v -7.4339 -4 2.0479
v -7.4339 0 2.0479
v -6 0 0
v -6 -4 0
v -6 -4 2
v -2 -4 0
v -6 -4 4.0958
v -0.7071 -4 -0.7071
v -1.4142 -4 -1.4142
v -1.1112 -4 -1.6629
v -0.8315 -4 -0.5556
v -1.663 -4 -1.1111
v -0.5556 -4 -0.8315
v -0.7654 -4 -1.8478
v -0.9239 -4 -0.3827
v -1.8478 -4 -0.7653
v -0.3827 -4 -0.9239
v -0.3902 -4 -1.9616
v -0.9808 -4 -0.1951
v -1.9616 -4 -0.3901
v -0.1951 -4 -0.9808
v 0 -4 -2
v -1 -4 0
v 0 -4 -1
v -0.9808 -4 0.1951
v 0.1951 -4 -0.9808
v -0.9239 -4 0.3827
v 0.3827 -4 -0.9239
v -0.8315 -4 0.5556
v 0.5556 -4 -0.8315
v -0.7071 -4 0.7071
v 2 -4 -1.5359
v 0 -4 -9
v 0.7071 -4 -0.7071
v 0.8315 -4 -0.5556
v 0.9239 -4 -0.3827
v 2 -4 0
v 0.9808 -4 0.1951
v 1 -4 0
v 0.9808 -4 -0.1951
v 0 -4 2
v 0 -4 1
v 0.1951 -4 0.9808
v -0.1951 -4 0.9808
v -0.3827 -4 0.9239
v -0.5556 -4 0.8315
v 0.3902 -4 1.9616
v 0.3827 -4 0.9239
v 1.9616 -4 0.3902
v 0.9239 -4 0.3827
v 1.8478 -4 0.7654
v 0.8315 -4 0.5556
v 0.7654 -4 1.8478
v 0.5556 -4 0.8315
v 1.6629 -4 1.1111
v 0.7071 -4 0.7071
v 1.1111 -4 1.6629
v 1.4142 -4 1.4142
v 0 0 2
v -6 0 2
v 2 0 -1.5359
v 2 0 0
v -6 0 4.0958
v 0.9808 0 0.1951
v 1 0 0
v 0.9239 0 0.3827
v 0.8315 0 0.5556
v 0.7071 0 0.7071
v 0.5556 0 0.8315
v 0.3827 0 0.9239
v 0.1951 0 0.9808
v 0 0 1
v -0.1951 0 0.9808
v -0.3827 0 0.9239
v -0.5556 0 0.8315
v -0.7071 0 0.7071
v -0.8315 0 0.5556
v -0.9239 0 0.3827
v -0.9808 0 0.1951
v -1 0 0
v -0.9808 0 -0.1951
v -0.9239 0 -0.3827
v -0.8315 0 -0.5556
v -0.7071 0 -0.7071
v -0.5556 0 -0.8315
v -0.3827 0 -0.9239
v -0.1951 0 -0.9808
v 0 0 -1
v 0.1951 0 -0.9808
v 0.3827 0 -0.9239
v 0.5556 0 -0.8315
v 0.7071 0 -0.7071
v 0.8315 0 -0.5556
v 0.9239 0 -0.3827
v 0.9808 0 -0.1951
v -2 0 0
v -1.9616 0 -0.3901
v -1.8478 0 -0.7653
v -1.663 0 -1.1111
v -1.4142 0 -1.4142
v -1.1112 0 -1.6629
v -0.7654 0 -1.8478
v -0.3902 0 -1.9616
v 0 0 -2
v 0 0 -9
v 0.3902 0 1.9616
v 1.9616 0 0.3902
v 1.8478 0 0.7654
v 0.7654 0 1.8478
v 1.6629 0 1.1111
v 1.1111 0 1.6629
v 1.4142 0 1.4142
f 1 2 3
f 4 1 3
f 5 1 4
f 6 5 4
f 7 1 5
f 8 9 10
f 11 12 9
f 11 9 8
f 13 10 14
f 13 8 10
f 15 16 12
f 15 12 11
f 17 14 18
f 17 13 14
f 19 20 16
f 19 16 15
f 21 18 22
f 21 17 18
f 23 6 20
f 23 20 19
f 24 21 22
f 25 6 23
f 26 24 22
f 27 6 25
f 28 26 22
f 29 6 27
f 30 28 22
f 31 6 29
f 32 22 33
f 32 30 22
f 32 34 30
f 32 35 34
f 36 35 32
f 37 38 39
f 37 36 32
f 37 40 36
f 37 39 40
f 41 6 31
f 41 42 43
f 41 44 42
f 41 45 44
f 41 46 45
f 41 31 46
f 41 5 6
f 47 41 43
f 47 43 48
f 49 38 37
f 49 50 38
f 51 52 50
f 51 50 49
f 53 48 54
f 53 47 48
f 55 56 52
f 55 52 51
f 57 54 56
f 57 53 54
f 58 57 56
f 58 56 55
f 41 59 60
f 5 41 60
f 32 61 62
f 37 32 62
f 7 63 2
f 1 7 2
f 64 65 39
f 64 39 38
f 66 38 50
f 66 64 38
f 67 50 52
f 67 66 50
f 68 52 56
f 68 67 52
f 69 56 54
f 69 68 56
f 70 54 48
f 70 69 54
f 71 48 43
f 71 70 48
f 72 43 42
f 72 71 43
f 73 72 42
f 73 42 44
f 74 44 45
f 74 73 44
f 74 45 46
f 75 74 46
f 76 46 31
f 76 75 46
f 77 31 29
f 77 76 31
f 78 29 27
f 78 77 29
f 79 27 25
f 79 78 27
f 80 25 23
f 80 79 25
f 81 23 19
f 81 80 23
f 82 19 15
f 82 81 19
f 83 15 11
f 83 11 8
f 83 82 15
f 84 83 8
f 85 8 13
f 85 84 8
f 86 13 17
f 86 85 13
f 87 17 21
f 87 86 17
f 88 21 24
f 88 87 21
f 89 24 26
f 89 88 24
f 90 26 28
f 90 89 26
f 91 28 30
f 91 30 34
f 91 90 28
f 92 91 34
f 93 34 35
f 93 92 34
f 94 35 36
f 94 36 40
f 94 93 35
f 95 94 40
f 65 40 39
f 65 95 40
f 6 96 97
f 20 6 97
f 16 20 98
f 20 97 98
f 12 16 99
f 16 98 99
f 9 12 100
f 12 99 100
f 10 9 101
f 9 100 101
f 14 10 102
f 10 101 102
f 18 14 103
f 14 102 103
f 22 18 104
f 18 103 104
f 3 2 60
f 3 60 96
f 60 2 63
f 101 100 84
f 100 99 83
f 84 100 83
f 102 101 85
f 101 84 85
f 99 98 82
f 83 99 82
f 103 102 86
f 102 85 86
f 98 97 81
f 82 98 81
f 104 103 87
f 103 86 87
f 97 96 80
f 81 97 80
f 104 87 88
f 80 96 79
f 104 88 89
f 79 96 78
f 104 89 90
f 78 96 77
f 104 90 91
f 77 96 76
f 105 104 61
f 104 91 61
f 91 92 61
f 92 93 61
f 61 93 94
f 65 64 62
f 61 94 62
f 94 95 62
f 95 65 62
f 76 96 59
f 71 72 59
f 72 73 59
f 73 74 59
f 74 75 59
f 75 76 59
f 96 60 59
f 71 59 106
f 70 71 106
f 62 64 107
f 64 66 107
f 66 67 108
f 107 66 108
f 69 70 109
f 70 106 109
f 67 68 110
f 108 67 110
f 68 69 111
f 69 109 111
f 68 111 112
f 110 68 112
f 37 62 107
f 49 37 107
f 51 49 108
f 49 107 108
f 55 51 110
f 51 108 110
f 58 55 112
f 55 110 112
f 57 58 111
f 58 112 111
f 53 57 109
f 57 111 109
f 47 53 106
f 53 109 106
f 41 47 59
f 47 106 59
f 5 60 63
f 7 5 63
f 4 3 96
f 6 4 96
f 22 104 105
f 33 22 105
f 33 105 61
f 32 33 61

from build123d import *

# Parameters (mm, degrees)
F0_R     = 1
F1_DEPTH = 4


with BuildPart() as f1:
    # F0 (on Front) → F1 (new body)
    with BuildSketch(Plane.XZ):
        with BuildLine():
            ThreePointArc((0, -2), (1.414214, -1.414214), (2, 0))
            ThreePointArc((2, 0), (1.414214, 1.414214), (0, 2))
            ThreePointArc((0, 2), (-1.414197, 1.41423), (-2, 4.6e-05))
            ThreePointArc((-2, 4.6e-05), (-1.41423, -1.414197), (0, -2))
        make_face()
        Circle(F0_R, mode=Mode.SUBTRACT)
        with BuildLine():
            Line((2, -1.535898), (2, 0))
            ThreePointArc((2, 0), (1.414214, -1.414214), (0, -2))
            Line((0, -2), (0, -9))
            Line((0, -9), (2, -1.535898))
        make_face()
        with BuildLine():
            ThreePointArc((-2, 4.6e-05), (-1.414197, 1.41423), (0, 2))
            Line((0, 2), (-6, 2))
            Line((-6, 2), (-6, 4.095806))
            Line((-6, 4.095806), (-7.433941, 2.047926))
            Line((-7.433941, 2.047926), (-6, 4.6e-05))
            Line((-6, 4.6e-05), (-2, 4.6e-05))
        make_face()
    extrude(amount=F1_DEPTH)


solid = f1.part
